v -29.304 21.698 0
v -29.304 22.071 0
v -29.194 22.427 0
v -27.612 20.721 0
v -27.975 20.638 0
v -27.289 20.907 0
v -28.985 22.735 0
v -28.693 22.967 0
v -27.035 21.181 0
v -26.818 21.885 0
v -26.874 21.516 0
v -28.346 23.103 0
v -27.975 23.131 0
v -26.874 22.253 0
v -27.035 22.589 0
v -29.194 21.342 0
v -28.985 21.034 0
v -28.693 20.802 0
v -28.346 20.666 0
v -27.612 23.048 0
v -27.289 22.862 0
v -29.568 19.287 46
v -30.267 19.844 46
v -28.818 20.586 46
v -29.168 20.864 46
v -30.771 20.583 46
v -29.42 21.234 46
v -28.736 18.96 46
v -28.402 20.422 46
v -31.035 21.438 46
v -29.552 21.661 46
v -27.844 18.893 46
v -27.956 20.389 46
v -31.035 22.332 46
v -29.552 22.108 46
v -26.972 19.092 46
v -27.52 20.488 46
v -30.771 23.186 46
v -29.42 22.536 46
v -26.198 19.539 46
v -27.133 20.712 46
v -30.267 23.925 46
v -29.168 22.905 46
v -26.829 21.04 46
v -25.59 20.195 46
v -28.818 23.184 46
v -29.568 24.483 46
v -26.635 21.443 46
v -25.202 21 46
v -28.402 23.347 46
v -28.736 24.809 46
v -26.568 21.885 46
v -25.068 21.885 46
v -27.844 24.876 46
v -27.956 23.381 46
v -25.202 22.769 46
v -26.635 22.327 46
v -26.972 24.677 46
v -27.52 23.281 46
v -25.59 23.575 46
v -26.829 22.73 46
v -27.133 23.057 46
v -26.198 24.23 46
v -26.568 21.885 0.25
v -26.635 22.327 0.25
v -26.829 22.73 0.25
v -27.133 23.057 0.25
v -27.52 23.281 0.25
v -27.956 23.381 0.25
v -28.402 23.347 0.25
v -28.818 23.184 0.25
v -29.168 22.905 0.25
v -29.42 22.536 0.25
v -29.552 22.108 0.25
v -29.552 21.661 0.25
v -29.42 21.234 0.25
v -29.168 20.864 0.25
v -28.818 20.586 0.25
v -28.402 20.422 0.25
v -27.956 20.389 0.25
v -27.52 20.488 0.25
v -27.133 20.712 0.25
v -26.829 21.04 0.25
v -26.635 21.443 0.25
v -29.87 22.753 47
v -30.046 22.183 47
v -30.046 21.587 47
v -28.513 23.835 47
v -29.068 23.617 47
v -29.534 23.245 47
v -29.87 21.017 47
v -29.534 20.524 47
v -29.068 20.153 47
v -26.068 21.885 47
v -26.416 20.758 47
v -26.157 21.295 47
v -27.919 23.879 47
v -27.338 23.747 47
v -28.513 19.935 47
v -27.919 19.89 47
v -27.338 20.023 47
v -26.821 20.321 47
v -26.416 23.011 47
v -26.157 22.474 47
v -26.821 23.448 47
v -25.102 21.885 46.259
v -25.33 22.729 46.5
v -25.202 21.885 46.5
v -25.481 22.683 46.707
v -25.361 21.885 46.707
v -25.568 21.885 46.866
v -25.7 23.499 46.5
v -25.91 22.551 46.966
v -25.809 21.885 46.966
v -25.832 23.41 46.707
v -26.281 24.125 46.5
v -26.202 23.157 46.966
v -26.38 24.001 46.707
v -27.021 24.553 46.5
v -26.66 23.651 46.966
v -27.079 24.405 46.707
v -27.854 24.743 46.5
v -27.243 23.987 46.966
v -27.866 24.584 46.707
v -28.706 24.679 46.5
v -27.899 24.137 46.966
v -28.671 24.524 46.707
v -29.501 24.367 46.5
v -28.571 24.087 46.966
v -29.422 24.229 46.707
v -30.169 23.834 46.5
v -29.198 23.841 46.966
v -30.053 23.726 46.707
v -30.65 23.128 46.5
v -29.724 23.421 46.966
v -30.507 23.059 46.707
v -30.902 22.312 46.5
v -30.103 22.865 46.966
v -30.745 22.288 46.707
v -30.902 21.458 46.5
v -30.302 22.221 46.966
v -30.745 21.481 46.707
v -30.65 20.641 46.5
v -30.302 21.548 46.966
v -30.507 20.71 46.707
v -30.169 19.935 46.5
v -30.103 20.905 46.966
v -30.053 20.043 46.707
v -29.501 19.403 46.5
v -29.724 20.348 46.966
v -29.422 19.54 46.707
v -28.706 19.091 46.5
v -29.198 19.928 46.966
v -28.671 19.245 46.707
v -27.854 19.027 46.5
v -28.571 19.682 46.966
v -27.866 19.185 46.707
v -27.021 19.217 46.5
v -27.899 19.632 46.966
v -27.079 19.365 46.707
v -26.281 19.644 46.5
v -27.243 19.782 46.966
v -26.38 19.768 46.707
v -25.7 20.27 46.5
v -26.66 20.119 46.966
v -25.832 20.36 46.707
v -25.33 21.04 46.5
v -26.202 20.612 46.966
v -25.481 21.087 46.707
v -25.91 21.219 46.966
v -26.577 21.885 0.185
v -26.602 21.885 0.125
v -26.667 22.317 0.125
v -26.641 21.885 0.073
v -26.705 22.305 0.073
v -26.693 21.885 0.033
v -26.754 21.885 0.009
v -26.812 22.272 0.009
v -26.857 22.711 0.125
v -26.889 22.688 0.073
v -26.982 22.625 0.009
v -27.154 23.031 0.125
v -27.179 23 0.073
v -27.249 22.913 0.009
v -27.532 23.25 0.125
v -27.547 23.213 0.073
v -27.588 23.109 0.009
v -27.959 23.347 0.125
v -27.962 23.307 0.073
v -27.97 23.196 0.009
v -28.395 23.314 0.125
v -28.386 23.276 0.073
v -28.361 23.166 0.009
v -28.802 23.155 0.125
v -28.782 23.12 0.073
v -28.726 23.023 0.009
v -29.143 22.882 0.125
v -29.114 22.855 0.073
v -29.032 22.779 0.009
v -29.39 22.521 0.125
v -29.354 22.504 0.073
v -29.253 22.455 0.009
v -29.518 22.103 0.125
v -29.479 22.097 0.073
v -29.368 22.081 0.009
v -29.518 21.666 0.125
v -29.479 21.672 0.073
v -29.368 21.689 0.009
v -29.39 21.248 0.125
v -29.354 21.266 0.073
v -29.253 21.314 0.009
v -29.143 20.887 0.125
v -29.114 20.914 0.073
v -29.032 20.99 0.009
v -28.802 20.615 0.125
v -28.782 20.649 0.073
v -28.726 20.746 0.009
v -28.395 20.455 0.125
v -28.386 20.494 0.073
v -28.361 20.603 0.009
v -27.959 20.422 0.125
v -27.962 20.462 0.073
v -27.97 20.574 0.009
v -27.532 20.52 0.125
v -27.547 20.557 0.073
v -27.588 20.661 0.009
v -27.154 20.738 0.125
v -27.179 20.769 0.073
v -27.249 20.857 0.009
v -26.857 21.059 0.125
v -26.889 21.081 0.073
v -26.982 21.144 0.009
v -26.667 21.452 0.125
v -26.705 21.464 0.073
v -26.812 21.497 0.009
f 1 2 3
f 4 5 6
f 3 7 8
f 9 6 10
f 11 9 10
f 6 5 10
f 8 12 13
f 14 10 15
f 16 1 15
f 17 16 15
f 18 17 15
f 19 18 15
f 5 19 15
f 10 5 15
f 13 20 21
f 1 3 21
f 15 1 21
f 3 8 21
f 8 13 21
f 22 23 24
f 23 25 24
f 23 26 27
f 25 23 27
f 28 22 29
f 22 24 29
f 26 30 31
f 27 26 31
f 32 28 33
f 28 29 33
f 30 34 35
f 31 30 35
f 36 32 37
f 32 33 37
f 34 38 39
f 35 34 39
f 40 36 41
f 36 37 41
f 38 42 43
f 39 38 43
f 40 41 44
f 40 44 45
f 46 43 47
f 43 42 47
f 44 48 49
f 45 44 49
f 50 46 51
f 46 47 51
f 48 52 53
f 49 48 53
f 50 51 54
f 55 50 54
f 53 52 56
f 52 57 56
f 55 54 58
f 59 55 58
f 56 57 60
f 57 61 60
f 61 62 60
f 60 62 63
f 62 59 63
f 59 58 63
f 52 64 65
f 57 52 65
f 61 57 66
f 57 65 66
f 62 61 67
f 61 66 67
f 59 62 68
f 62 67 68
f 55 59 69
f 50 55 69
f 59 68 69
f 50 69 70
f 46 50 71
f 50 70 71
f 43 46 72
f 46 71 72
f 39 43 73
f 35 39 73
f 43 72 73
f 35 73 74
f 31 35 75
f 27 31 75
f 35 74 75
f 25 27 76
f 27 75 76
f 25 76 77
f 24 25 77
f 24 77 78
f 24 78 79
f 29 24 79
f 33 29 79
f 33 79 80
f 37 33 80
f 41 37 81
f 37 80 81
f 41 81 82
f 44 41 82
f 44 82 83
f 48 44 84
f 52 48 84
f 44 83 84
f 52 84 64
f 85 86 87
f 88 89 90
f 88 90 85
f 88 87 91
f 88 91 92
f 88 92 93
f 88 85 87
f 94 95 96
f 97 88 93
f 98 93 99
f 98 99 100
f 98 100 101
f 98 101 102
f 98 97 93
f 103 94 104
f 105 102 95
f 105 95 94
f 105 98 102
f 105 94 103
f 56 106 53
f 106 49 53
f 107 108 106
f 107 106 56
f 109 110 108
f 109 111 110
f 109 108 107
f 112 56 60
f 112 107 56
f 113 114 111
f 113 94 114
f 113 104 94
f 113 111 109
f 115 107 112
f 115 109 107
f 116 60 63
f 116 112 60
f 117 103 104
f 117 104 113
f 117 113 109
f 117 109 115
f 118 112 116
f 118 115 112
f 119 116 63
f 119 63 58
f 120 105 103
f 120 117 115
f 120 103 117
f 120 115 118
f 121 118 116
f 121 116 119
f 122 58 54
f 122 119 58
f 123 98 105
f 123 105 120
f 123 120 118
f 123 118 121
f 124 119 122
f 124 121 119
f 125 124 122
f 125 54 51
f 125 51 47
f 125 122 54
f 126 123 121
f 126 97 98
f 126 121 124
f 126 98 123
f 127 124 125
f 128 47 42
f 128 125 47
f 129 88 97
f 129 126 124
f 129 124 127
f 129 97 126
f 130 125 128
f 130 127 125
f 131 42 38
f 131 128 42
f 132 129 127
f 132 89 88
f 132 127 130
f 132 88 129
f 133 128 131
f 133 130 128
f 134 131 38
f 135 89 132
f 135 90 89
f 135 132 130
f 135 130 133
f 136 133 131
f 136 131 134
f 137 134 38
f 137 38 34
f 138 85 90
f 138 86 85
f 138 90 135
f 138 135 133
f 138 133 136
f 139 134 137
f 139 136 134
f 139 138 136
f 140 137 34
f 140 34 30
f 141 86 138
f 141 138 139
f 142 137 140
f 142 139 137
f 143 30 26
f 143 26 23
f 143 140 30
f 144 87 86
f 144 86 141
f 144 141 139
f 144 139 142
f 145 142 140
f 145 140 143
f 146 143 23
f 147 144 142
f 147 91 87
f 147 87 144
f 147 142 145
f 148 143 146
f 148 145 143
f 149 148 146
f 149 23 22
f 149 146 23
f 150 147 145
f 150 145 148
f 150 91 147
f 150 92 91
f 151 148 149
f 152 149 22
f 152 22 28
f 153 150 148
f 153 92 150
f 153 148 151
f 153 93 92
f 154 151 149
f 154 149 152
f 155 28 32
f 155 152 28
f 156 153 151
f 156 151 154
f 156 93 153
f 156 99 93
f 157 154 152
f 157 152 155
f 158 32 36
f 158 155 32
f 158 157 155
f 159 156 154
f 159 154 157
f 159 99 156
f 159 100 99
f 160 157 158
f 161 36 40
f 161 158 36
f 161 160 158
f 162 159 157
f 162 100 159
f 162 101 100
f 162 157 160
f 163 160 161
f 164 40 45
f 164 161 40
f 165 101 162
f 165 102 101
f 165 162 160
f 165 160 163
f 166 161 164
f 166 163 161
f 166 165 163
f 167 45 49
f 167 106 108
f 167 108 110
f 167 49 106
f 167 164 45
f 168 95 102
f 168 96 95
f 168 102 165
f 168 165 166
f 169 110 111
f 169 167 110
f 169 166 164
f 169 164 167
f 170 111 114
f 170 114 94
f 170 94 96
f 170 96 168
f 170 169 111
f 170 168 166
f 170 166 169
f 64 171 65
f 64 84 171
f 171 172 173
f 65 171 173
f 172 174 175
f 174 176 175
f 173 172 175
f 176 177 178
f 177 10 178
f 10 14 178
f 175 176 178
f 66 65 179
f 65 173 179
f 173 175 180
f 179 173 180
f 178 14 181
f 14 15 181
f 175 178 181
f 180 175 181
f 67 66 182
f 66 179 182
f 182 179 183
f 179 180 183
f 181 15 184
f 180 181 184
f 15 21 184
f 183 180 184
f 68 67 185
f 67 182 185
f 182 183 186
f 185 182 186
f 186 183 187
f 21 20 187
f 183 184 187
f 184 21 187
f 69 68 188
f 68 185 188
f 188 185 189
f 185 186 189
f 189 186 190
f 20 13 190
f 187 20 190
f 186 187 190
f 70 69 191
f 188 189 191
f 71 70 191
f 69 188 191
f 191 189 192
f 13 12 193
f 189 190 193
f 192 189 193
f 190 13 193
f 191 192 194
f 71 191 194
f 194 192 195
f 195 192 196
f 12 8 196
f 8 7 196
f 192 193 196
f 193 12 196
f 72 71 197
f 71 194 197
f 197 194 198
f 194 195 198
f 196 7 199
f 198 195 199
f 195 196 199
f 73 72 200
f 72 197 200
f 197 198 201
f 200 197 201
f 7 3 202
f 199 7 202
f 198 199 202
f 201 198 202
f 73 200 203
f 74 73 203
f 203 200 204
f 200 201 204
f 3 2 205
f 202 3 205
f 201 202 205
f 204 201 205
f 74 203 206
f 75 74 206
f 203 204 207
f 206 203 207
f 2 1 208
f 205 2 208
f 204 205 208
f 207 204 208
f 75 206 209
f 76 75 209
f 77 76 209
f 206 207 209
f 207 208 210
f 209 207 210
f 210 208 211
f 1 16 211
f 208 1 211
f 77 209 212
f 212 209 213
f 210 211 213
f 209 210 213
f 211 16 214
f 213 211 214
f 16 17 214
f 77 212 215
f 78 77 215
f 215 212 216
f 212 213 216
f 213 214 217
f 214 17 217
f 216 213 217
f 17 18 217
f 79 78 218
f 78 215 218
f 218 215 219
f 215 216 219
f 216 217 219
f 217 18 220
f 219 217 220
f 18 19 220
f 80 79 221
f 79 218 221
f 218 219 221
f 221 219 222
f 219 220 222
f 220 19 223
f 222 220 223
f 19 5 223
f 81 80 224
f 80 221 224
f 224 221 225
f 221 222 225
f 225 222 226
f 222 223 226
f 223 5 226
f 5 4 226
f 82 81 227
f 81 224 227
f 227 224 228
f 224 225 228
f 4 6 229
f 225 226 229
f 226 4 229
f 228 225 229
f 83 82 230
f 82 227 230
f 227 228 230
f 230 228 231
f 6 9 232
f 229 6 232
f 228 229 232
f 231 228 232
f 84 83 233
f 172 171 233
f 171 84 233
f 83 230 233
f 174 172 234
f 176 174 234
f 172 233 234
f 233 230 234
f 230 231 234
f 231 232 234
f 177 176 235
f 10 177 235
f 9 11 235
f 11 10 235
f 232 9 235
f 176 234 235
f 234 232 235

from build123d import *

# Parameters (mm, degrees)
ESQUISSE1_R        = 1.5
BOSS_EXTRU_1_DEPTH = 46
ESQUISSE2_R        = 3
BOSS_EXTRU_2_DEPTH = 1
CONG_1_R           = 1
CONG_2_R           = 0.25


with BuildPart() as part:
    # Esquisse1 → Boss.-Extru.1 (new body)
    with BuildSketch(Plane.XY):
        with Locations((-28.068256791, 21.884700983)):
            Circle(ESQUISSE1_R)
    extrude(amount=BOSS_EXTRU_1_DEPTH)

    # Esquisse2 → Boss.-Extru.2 (add)
    with BuildSketch(Plane.XY.offset(46)):
        with Locations((-28.068256791, 21.884700983)):
            Circle(ESQUISSE2_R)
    extrude(amount=BOSS_EXTRU_2_DEPTH)

    # Congé1
    cong_1_edges = [part.edges().sort_by_distance(p)[0] for p in [
        (-31.068256791, 21.884700983, 47),
    ]]
    fillet(cong_1_edges, radius=CONG_1_R - 0.0001)  # a hair under: the kernel refuses the full size

    # Congé2
    cong_2_edges = [part.edges().sort_by_distance(p)[0] for p in [
        (-29.568256791, 21.884700983, 0),
    ]]
    fillet(cong_2_edges, radius=CONG_2_R)


solid = part.part
